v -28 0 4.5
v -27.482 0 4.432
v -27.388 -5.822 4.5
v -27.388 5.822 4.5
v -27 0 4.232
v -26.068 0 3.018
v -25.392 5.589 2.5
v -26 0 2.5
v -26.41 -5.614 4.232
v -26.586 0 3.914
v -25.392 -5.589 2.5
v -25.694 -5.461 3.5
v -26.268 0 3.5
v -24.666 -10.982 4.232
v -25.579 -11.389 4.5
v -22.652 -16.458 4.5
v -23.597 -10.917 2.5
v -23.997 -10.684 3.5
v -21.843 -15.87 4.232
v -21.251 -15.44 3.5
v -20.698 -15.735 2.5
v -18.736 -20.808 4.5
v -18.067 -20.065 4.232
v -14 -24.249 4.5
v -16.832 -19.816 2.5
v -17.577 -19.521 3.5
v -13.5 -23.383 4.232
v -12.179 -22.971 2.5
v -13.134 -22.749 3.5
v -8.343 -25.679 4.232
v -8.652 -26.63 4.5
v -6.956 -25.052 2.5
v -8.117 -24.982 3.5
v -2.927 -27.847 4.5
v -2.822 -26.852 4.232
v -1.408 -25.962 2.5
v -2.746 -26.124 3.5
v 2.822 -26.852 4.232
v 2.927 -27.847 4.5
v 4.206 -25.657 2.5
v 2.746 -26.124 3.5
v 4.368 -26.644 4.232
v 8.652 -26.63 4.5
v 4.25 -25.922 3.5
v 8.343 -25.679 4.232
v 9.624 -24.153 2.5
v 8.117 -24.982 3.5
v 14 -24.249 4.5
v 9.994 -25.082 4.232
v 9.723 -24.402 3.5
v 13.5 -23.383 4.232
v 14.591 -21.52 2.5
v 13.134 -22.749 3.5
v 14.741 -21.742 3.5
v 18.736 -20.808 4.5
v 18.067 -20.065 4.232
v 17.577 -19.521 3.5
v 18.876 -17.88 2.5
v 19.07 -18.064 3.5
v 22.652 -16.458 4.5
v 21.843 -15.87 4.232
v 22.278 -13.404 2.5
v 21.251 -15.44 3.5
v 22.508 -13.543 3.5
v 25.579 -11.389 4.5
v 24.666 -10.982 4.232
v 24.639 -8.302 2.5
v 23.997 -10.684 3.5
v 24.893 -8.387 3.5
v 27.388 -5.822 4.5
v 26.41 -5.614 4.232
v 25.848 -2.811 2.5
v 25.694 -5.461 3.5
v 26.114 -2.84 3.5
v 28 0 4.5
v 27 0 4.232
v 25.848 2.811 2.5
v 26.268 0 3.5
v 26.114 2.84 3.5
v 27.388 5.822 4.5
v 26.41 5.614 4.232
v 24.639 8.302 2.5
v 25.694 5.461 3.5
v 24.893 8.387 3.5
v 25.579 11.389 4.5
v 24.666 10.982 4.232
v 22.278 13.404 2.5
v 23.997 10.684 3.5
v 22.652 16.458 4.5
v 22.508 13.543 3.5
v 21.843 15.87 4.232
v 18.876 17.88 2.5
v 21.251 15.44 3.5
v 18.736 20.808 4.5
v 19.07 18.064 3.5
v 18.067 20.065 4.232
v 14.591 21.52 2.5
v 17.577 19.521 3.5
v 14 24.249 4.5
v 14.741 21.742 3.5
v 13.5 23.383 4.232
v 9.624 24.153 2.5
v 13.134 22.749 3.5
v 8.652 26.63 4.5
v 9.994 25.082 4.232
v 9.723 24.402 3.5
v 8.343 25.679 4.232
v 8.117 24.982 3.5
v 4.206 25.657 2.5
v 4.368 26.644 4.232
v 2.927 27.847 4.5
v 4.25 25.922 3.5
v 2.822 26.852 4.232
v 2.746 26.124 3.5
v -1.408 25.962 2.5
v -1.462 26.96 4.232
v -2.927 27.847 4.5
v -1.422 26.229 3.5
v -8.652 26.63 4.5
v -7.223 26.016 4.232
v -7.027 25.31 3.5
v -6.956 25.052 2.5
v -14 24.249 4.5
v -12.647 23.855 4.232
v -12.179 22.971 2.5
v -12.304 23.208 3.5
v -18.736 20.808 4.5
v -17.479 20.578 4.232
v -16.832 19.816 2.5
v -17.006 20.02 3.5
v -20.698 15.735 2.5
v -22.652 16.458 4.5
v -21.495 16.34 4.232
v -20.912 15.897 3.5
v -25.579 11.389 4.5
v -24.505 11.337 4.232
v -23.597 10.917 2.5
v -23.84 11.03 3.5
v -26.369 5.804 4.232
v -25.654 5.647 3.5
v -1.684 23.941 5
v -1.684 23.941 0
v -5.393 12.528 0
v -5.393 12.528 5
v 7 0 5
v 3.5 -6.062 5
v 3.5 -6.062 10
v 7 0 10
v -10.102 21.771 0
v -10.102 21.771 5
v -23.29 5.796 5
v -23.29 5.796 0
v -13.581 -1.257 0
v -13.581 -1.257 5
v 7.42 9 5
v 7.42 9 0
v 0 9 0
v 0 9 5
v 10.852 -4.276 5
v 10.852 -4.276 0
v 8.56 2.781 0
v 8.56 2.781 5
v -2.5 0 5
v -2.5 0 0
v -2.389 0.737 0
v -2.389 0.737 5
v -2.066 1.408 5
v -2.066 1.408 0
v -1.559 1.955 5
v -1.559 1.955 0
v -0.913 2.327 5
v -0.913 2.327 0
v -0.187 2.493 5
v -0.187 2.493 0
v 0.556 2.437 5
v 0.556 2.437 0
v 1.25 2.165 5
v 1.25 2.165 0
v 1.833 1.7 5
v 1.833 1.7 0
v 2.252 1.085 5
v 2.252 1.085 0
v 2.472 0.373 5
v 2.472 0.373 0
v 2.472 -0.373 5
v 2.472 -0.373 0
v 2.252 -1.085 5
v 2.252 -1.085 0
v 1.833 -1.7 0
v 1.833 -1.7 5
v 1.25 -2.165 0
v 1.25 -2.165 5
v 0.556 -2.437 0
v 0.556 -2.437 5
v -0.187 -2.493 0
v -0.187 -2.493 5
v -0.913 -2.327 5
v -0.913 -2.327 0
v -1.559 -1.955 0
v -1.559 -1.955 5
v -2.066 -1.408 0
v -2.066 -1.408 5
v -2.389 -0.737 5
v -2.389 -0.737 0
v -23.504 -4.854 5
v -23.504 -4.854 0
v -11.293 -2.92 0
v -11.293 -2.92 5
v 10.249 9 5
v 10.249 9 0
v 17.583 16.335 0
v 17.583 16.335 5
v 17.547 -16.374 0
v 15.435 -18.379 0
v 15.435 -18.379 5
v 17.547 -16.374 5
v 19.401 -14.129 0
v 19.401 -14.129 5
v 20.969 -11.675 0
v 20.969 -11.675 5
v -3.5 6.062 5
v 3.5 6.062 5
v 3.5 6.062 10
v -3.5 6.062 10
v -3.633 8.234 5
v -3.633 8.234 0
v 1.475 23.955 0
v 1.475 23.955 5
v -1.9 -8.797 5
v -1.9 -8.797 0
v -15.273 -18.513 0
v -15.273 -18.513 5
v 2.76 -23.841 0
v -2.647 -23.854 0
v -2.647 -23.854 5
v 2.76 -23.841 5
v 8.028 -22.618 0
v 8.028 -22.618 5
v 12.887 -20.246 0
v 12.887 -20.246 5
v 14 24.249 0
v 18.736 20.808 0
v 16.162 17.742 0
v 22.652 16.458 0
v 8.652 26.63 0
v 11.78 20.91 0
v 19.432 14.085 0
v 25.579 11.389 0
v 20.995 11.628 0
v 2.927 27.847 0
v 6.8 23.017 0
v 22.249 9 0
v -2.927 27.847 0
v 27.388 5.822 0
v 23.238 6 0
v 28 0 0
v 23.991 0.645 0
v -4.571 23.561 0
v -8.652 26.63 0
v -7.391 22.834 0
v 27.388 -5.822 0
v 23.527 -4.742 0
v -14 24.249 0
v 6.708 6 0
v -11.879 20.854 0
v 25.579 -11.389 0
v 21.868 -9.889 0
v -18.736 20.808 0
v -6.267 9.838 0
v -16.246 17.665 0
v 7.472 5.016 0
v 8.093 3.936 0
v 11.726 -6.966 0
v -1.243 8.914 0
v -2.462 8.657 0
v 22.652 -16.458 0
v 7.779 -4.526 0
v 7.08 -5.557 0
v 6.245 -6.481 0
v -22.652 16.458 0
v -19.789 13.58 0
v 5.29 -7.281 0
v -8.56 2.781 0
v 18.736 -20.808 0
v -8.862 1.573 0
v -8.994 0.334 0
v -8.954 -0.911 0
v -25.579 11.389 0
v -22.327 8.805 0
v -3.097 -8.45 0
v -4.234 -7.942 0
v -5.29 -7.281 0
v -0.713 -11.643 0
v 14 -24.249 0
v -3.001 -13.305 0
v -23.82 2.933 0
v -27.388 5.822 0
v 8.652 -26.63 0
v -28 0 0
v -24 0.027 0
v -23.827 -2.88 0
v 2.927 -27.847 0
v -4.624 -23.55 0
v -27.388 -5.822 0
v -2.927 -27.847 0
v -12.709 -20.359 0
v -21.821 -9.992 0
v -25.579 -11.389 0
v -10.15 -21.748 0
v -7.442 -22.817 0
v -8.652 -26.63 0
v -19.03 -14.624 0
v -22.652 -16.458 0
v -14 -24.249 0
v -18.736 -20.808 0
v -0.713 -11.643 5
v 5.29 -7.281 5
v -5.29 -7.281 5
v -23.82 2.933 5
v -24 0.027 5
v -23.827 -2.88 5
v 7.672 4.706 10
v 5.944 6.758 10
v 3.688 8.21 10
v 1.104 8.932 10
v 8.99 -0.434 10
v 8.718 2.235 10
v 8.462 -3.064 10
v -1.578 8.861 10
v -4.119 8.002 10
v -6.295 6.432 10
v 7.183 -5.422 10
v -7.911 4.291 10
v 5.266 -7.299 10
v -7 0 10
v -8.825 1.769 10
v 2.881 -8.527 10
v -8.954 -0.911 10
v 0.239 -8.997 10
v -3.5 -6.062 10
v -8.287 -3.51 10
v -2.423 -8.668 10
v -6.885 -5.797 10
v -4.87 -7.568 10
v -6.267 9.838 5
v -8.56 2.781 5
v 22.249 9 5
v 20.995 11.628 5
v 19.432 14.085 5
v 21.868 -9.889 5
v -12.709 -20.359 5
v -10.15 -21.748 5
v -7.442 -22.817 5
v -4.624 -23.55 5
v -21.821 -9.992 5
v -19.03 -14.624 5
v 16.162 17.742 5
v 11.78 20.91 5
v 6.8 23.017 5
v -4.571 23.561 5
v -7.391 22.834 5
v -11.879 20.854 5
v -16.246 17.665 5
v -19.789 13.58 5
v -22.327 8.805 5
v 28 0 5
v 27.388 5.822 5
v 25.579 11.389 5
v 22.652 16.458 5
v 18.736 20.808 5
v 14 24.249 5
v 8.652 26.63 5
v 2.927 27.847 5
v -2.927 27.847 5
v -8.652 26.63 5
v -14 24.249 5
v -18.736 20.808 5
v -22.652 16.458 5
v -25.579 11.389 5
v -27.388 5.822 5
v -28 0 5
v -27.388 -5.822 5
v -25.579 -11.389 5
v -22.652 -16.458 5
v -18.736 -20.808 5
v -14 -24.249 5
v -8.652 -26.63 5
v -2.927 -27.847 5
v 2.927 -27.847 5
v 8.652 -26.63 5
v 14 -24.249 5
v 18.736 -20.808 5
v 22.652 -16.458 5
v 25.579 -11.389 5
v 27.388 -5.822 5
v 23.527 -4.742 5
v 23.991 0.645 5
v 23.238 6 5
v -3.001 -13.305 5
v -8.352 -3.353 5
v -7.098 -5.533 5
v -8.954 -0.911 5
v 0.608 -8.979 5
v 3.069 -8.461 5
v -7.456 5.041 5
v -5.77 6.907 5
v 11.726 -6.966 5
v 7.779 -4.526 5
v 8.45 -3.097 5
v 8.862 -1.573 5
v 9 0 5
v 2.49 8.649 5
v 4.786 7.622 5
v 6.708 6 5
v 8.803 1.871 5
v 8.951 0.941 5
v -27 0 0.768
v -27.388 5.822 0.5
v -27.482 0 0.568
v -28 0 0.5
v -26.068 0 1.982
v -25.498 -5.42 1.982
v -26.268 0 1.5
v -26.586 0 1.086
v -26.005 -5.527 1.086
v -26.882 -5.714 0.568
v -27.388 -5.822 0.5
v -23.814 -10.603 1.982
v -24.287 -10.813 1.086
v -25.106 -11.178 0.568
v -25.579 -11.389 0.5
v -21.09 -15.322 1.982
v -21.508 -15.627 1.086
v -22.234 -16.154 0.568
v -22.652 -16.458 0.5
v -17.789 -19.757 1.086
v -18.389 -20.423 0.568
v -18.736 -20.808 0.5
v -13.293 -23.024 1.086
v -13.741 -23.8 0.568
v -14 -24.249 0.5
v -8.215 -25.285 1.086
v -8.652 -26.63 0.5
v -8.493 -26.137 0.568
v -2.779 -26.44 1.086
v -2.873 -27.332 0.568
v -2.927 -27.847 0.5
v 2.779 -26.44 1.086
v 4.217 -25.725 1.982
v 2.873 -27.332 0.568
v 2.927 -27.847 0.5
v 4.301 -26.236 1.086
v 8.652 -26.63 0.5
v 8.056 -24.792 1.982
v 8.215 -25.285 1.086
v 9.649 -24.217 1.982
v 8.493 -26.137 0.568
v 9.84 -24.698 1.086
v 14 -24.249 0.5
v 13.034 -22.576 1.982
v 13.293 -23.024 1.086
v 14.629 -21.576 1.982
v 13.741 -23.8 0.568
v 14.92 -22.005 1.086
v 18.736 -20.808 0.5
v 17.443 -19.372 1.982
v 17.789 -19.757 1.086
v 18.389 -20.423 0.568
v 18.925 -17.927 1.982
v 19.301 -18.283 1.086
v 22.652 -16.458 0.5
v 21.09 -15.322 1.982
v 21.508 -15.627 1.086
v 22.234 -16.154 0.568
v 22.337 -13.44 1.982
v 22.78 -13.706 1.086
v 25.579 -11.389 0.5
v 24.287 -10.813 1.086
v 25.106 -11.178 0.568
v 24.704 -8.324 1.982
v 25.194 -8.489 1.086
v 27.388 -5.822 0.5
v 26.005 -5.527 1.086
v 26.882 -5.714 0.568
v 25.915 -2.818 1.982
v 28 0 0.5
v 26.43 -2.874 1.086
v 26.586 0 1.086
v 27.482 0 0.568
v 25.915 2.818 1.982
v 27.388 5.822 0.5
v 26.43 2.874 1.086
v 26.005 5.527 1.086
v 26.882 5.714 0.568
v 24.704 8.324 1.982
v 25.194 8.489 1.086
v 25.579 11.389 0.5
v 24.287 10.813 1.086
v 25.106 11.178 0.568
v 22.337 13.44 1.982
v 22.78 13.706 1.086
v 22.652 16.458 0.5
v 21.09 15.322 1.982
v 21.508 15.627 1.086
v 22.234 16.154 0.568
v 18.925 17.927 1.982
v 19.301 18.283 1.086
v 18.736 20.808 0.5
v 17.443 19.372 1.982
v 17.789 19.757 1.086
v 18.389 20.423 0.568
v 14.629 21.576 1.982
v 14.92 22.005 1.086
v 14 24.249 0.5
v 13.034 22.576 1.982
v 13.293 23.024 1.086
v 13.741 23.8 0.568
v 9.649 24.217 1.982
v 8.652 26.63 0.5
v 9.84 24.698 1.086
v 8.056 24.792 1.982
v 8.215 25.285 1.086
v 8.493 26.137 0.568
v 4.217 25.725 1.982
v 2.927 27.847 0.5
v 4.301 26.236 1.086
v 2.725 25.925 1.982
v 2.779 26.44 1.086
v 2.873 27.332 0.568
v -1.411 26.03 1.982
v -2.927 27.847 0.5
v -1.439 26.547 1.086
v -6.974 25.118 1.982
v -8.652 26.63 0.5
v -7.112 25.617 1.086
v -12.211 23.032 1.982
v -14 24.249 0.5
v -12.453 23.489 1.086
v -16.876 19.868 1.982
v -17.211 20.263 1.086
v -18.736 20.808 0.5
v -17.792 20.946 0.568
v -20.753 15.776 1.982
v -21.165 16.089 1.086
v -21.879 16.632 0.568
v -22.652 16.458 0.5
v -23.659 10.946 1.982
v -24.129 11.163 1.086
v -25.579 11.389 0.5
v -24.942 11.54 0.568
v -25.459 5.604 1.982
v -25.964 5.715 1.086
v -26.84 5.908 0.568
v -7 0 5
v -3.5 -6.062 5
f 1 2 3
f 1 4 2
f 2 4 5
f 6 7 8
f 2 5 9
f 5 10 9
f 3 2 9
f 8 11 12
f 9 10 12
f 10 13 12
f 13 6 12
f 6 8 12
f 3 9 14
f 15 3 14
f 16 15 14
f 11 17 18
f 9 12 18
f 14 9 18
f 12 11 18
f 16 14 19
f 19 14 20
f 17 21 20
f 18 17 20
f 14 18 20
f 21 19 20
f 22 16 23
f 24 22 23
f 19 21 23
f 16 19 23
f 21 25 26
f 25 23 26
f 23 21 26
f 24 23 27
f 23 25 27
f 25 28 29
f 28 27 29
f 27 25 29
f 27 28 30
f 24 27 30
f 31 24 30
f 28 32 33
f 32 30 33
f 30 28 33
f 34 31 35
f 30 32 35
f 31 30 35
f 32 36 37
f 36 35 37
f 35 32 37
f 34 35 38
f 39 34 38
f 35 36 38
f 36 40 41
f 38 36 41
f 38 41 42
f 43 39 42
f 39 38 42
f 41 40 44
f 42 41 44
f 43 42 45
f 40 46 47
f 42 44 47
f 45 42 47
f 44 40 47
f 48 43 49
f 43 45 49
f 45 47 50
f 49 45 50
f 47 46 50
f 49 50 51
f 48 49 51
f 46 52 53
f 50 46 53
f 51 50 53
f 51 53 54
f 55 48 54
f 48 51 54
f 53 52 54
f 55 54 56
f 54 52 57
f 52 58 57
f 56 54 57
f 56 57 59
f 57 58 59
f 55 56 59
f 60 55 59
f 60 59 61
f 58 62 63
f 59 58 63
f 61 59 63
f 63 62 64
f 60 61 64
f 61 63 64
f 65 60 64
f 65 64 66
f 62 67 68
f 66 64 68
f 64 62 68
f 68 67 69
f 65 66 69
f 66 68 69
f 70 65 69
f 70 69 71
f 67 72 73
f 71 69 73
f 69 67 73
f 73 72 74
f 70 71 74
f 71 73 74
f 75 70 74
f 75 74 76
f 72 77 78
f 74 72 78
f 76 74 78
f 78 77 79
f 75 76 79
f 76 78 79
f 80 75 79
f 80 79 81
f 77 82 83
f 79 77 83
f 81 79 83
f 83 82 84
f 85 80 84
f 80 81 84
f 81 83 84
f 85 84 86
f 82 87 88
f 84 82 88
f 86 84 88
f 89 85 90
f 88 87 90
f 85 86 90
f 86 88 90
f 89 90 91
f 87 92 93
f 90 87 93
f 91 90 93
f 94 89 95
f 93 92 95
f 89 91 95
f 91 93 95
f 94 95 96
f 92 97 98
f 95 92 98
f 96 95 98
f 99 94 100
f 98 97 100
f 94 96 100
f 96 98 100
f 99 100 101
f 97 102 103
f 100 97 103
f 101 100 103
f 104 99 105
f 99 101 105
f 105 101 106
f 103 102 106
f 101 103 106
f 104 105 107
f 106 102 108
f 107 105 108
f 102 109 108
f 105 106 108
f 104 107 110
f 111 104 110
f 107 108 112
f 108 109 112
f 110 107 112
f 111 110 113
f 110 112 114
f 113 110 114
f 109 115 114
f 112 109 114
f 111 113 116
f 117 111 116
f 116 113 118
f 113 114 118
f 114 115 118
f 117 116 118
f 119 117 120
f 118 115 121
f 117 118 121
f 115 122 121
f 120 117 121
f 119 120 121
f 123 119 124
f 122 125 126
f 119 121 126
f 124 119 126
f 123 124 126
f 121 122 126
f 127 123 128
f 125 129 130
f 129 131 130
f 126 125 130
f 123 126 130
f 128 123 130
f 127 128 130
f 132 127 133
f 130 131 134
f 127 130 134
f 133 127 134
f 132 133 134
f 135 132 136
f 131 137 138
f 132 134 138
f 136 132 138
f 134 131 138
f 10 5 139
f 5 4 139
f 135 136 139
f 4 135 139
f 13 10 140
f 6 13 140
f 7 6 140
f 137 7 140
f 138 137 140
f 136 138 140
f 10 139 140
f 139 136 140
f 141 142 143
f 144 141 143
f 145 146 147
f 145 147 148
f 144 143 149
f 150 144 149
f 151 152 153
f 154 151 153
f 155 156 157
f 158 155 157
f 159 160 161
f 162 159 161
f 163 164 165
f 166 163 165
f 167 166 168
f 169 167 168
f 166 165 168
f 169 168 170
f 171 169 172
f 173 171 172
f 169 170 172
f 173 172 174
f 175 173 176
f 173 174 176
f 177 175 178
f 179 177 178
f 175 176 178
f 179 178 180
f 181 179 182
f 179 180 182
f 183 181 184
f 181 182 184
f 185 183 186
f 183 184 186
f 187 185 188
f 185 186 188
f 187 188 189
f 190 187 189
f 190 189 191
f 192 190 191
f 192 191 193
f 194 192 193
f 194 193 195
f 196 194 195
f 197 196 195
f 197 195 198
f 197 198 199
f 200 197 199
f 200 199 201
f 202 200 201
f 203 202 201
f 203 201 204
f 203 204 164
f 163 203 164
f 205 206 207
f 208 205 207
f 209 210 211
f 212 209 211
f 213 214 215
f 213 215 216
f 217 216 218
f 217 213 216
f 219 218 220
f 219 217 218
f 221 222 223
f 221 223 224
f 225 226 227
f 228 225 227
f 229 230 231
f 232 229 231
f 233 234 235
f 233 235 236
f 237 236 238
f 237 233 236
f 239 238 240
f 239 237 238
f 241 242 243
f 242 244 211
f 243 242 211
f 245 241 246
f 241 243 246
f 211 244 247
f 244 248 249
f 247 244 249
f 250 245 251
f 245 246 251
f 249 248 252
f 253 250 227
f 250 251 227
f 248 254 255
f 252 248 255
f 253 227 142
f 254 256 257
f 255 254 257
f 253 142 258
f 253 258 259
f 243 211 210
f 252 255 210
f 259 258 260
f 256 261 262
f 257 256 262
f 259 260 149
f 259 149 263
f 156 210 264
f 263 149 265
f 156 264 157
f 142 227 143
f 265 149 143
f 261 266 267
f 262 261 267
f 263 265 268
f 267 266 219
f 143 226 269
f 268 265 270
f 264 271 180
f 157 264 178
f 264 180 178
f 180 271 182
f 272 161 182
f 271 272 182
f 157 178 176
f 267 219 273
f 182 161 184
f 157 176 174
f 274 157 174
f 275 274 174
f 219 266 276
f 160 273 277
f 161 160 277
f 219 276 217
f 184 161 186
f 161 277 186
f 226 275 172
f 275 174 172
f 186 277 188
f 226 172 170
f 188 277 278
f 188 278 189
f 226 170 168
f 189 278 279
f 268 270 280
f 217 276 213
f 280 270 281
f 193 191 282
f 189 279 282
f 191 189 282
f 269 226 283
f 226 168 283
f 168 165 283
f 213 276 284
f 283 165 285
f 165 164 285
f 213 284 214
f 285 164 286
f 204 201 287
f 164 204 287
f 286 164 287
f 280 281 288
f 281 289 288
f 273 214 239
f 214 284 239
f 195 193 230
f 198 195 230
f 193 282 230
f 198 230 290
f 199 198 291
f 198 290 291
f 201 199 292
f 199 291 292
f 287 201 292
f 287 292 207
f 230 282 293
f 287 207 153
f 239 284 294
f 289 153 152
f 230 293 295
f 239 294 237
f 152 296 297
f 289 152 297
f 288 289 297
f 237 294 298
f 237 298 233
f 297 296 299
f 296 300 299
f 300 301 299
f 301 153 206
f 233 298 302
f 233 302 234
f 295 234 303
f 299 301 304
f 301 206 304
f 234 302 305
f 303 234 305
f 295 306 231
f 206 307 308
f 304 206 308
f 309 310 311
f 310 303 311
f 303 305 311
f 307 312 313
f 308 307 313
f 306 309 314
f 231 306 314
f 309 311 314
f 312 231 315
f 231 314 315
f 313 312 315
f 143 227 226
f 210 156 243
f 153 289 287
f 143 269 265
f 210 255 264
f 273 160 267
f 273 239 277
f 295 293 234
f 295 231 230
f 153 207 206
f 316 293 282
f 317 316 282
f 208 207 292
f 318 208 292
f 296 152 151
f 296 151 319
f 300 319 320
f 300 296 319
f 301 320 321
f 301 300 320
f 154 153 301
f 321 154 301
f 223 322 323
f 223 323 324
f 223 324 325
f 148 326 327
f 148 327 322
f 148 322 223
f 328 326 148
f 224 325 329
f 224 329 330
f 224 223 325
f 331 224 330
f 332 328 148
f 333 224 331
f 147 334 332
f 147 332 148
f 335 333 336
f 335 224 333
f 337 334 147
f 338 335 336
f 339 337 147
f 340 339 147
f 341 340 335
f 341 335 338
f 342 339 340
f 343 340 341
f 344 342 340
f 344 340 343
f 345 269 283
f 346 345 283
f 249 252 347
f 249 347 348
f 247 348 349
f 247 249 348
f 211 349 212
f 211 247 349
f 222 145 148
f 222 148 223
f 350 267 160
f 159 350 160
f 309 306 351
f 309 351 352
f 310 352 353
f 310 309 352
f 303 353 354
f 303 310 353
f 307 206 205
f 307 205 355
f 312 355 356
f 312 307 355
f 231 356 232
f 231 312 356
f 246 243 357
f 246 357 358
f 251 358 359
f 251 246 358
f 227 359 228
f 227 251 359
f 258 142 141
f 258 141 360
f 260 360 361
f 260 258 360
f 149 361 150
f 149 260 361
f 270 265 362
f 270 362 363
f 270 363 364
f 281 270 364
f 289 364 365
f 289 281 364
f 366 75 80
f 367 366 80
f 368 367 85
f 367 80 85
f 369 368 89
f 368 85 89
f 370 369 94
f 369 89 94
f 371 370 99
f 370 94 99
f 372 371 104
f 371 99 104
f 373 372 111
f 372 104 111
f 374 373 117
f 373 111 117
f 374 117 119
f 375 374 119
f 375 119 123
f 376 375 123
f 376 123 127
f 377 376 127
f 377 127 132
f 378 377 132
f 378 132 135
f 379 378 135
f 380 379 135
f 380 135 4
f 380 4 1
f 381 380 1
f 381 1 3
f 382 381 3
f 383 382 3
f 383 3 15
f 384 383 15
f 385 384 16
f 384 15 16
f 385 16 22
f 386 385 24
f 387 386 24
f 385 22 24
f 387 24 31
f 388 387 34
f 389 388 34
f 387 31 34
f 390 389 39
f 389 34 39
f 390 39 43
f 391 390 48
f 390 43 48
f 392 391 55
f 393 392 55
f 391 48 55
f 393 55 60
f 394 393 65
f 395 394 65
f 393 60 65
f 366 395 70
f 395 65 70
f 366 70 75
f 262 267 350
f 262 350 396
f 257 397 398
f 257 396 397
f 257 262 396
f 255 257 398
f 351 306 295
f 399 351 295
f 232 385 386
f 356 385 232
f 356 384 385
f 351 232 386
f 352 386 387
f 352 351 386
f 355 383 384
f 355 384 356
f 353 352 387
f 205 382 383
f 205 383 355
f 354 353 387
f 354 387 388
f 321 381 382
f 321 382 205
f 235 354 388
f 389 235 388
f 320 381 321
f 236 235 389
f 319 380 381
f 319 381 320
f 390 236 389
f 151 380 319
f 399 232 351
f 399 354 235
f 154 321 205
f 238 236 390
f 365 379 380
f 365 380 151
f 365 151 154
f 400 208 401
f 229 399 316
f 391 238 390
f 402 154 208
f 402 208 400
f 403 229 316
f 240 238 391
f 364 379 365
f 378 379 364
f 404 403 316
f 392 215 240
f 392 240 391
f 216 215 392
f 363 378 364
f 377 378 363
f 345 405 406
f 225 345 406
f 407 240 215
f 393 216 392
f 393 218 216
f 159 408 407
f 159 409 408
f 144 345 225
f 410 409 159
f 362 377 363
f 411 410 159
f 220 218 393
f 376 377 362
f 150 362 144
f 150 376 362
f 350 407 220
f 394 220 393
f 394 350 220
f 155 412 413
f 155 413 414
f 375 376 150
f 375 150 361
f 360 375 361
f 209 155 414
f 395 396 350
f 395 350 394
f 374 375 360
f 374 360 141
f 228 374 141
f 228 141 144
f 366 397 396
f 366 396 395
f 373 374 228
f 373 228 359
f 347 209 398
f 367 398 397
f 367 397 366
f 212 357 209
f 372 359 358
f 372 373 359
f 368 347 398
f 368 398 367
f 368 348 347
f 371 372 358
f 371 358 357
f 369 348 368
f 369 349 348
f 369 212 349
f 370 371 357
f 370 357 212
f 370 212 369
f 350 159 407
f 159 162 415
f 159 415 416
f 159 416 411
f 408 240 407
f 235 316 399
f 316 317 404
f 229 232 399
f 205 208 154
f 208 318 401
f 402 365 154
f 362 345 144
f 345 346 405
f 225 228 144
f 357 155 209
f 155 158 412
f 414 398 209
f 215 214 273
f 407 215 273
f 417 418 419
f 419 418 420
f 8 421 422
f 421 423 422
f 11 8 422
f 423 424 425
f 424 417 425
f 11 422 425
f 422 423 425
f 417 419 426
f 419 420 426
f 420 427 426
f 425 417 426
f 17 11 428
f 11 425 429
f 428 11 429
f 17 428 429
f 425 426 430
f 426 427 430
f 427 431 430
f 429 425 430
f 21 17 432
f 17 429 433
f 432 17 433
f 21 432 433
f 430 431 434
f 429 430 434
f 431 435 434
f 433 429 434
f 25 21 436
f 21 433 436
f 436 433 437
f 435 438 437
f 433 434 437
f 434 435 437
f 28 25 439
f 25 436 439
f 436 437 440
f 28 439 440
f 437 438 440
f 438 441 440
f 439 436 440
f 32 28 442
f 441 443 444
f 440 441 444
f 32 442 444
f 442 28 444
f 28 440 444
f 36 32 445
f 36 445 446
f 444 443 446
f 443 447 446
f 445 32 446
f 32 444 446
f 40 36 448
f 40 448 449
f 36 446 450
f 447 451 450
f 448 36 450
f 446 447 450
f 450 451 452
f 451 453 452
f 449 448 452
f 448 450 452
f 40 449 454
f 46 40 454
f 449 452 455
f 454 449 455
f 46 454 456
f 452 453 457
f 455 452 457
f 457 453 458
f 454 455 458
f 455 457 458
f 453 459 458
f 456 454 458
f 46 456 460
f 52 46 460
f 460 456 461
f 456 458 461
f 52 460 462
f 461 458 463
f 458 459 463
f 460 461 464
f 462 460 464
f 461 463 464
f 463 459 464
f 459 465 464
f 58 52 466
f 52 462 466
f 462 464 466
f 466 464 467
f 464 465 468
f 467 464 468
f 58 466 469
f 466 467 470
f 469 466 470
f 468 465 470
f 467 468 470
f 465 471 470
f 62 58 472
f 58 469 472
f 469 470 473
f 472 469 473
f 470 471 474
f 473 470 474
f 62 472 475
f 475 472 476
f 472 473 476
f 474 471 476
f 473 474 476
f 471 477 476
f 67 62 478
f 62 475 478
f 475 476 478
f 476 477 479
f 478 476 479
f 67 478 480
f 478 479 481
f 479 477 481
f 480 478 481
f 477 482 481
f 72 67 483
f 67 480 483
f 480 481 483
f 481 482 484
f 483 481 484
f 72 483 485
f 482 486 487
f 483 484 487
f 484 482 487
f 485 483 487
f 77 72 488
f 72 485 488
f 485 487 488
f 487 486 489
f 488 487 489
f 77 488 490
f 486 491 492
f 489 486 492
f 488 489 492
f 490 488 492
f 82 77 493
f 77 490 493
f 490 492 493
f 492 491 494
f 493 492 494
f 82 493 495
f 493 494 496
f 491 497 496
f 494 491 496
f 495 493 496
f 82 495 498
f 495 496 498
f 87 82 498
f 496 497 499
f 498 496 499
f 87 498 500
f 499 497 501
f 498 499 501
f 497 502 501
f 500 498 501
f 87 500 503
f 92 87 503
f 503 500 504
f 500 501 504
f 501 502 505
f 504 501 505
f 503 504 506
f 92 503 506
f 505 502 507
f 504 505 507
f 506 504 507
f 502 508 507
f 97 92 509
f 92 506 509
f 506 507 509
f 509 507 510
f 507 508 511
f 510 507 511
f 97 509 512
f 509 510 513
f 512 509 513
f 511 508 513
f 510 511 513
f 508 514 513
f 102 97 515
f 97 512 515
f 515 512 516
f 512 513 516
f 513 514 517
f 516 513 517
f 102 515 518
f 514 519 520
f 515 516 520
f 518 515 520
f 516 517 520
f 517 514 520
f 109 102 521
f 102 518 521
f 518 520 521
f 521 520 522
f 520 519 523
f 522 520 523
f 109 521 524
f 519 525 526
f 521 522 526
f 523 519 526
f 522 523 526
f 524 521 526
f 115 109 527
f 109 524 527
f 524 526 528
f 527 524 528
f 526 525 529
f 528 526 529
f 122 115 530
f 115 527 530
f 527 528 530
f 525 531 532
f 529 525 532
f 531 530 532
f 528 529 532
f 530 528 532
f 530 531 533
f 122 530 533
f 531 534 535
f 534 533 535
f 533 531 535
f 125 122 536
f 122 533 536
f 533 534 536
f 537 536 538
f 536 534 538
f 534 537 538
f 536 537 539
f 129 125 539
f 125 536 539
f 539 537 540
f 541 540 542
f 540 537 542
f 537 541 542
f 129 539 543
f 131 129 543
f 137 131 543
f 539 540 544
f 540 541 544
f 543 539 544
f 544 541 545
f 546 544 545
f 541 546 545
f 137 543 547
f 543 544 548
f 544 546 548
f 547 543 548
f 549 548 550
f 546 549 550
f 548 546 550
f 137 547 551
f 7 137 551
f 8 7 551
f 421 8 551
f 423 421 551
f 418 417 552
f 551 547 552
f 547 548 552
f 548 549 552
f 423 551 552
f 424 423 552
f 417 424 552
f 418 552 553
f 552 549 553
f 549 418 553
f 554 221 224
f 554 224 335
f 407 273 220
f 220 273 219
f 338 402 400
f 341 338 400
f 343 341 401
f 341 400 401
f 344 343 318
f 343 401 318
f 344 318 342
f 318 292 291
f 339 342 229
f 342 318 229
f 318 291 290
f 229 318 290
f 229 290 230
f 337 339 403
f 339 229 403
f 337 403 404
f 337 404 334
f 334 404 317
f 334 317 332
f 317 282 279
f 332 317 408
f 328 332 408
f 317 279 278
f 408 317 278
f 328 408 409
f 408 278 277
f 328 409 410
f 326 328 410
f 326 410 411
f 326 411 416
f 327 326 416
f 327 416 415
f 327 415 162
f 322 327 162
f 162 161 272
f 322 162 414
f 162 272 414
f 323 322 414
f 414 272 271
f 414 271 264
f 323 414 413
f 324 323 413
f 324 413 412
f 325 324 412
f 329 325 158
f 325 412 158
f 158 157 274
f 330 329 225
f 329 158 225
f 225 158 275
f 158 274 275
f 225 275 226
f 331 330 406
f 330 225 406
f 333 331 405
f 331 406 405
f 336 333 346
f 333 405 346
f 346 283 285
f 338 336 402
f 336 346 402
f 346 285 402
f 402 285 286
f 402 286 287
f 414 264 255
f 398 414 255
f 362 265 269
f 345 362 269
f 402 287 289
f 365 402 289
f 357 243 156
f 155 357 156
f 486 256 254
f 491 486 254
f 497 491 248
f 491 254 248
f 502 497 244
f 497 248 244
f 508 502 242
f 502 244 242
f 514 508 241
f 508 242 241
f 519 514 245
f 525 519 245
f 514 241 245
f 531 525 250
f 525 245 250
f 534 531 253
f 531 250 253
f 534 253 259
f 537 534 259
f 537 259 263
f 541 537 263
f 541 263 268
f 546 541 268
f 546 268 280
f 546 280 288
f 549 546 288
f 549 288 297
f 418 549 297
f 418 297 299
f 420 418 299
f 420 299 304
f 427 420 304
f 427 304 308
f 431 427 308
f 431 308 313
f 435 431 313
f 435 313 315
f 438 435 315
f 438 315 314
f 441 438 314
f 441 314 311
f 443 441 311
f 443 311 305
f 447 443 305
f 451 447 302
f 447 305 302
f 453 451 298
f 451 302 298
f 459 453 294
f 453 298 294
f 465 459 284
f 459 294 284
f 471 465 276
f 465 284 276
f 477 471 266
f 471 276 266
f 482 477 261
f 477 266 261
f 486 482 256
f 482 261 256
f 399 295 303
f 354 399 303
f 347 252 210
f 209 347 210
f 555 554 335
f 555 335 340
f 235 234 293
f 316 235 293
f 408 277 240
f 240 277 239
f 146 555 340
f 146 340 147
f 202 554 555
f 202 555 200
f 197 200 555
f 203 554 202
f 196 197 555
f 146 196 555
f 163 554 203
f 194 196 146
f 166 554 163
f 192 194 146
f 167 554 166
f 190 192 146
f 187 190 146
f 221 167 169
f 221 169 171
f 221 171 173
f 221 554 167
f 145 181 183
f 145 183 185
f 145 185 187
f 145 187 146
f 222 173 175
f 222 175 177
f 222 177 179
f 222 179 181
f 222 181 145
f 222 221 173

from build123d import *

# Parameters (mm, degrees)
SKETCH_1_R          = 28
SKETCH_1_R_2        = 24
EXTRUDE_1_DEPTH     = 5
SKETCH_1_3_R        = 9
EXTRUDE_2_DEPTH     = 10
SKETCH_2_R          = 2.5
CUT_EXTRUDE_1_DEPTH = 41.841155713
SKETCH_3_R          = 2


with BuildPart() as part:
    # 草图1 → 凸台-拉伸1 (new body)
    # profile 1 of 12: a face of its own
    with BuildSketch(Plane.XY):
        Circle(SKETCH_1_R)
        Circle(SKETCH_1_R_2, mode=Mode.SUBTRACT)
    # profile 2 of 12: a face of its own
    with BuildSketch(Plane.XY):
        with BuildLine():
            Line((-11.87931448, 20.853821892), (-6.26655053, 9.838152398))
            Line((-6.26655053, 9.838152398), (-5.392518481, 12.528146446))
            Line((-5.392518481, 12.528146446), (-10.101735892, 21.770506011))
            ThreePointArc((-10.101735892, 21.770506011), (-11.000078241, 21.33068866), (-11.87931448, 20.853821892))
        make_face()
    # profile 3 of 12: a face of its own
    with BuildSketch(Plane.XY):
        with BuildLine():
            ThreePointArc((-8.559508647, 2.781152949), (-6.678325674, 6.033238449), (-3.633390081, 8.233983029))
            Line((-3.633390081, 8.233983029), (1.47456694, 23.95465826))
            ThreePointArc((1.47456694, 23.95465826), (-0.105101651, 23.999769866), (-1.684314548, 23.940824641))
            Line((-1.684314548, 23.940824641), (-5.392518481, 12.528146446))
            Line((-5.392518481, 12.528146446), (-6.26655053, 9.838152398))
            Line((-6.26655053, 9.838152398), (-8.559508647, 2.781152949))
        make_face()
    # profile 4 of 12: a face of its own
    with BuildSketch(Plane.XY):
        with BuildLine():
            Line((16.162253144, 17.742084807), (7.420168337, 9))
            Line((7.420168337, 9), (10.248595461, 9))
            Line((10.248595461, 9), (17.583373541, 16.33477808))
            ThreePointArc((17.583373541, 16.33477808), (16.887479331, 17.053241388), (16.162253144, 17.742084807))
        make_face()
    # profile 5 of 12: a face of its own
    with BuildSketch(Plane.XY):
        with BuildLine():
            Line((7.420168337, 9), (0, 9))
            ThreePointArc((0, 9), (3.674234614, 8.215838363), (6.708203932, 6))
            Line((6.708203932, 6), (23.237900077, 6))
            ThreePointArc((23.237900077, 6), (22.792659325, 7.51629436), (22.248595461, 9))
            Line((22.248595461, 9), (10.248595461, 9))
            Line((10.248595461, 9), (7.420168337, 9))
        make_face()
    # profile 6 of 12: a face of its own
    with BuildSketch(Plane.XY):
        with BuildLine():
            Line((10.852466764, -4.275846499), (8.559508647, 2.781152949))
            ThreePointArc((8.559508647, 2.781152949), (8.889195065, 1.407910185), (9, 0))
            ThreePointArc((9, 0), (8.689464685, -2.34375841), (7.779288115, -4.525779096))
            Line((7.779288115, -4.525779096), (12.887245135, -20.246454327))
            ThreePointArc((12.887245135, -20.246454327), (14.191739808, -19.354444483), (15.434702745, -18.378518742))
            Line((15.434702745, -18.378518742), (11.726498813, -6.965840547))
            Line((11.726498813, -6.965840547), (10.852466764, -4.275846499))
        make_face()
    # profile 7 of 12: a face of its own
    with BuildSketch(Plane.XY):
        with BuildLine():
            Line((21.868136258, -9.888610449), (10.852466764, -4.275846499))
            Line((10.852466764, -4.275846499), (11.726498813, -6.965840547))
            Line((11.726498813, -6.965840547), (20.968858378, -11.675057959))
            ThreePointArc((20.968858378, -11.675057959), (21.437114452, -10.791205863), (21.868136258, -9.888610449))
        make_face()
    # profile 8 of 12: a face of its own
    with BuildSketch(Plane.XY):
        with BuildLine():
            Line((-0.712975015, -11.642618467), (5.290067271, -7.281152949))
            ThreePointArc((5.290067271, -7.281152949), (1.856630381, -8.806413778), (-1.900339469, -8.797085307))
            Line((-1.900339469, -8.797085307), (-15.273144562, -18.512996926))
            ThreePointArc((-15.273144562, -18.512996926), (-14.021681764, -19.477998884), (-12.709424559, -20.358549246))
            Line((-12.709424559, -20.358549246), (-3.001220626, -13.305126218))
            Line((-3.001220626, -13.305126218), (-0.712975015, -11.642618467))
        make_face()
    # profile 9 of 12: a face of its own
    with BuildSketch(Plane.XY):
        with BuildLine():
            ThreePointArc((-4.623906358, -23.550360719), (-3.638613979, -23.722573391), (-2.647001666, -23.853582167))
            Line((-2.647001666, -23.853582167), (-0.712975015, -11.642618467))
            Line((-0.712975015, -11.642618467), (-3.001220626, -13.305126218))
            Line((-3.001220626, -13.305126218), (-4.623906358, -23.550360719))
        make_face()
    # profile 10 of 12: a face of its own
    with BuildSketch(Plane.XY):
        with BuildLine():
            Line((-23.504073256, -4.853714083), (-11.293109556, -2.919687432))
            Line((-11.293109556, -2.919687432), (-13.581355167, -1.257179681))
            Line((-13.581355167, -1.257179681), (-23.826589668, -2.879865413))
            ThreePointArc((-23.826589668, -2.879865413), (-23.685901563, -3.870150793), (-23.504073256, -4.853714083))
        make_face()
    # profile 11 of 12: a face of its own
    with BuildSketch(Plane.XY):
        with BuildLine():
            ThreePointArc((-5.290067271, -7.281152949), (-7.801666869, -4.487091939), (-8.953762497, -0.911118625))
            Line((-8.953762497, -0.911118625), (-22.32656759, 8.804792993))
            ThreePointArc((-22.32656759, 8.804792993), (-22.857615717, 7.31637914), (-23.2895591, 5.796243347))
            Line((-23.2895591, 5.796243347), (-13.581355167, -1.257179681))
            Line((-13.581355167, -1.257179681), (-11.293109556, -2.919687432))
            Line((-11.293109556, -2.919687432), (-5.290067271, -7.281152949))
        make_face()
    # profile 12 of 12: a face of its own
    with BuildSketch(Plane.XY):
        Polygon((7, 0), (3.5, 6.062177826), (-3.5, 6.062177826), (-7, 0), (-3.5, -6.062177826), (3.5, -6.062177826), align=None)
    extrude(amount=EXTRUDE_1_DEPTH)

    # 草图1<3> → 凸台-拉伸2 (add)
    with BuildSketch(Plane.XY):
        with Locations(Location((0, 0, 0), (0, 0, 185.810314896))):
            Circle(SKETCH_1_3_R)
        Polygon((3.5, 6.062177826), (-3.5, 6.062177826), (-7, 0), (-3.5, -6.062177826), (3.5, -6.062177826), (7, 0), align=None, mode=Mode.SUBTRACT)
    extrude(amount=EXTRUDE_2_DEPTH)

    # 草图2 → 切除-拉伸1 (cut, through all)
    with BuildSketch(Plane(origin=(0, 0, 0), x_dir=(-1, 0, 0), z_dir=(0, 0, -1))):
        Circle(SKETCH_2_R)
    extrude(amount=-CUT_EXTRUDE_1_DEPTH, mode=Mode.SUBTRACT)

    # 草图3 → 切除-旋转1 (revolve, cut)
    with BuildSketch(Plane(origin=(0, 0, 0), x_dir=(1, 0, 0), z_dir=(0, 1, 0))):
        with Locations((-28, -2.5)):
            Circle(SKETCH_3_R)
    revolve(axis=Axis((0, 0, 0), (0, 0, 1)), mode=Mode.SUBTRACT)


solid = part.part
